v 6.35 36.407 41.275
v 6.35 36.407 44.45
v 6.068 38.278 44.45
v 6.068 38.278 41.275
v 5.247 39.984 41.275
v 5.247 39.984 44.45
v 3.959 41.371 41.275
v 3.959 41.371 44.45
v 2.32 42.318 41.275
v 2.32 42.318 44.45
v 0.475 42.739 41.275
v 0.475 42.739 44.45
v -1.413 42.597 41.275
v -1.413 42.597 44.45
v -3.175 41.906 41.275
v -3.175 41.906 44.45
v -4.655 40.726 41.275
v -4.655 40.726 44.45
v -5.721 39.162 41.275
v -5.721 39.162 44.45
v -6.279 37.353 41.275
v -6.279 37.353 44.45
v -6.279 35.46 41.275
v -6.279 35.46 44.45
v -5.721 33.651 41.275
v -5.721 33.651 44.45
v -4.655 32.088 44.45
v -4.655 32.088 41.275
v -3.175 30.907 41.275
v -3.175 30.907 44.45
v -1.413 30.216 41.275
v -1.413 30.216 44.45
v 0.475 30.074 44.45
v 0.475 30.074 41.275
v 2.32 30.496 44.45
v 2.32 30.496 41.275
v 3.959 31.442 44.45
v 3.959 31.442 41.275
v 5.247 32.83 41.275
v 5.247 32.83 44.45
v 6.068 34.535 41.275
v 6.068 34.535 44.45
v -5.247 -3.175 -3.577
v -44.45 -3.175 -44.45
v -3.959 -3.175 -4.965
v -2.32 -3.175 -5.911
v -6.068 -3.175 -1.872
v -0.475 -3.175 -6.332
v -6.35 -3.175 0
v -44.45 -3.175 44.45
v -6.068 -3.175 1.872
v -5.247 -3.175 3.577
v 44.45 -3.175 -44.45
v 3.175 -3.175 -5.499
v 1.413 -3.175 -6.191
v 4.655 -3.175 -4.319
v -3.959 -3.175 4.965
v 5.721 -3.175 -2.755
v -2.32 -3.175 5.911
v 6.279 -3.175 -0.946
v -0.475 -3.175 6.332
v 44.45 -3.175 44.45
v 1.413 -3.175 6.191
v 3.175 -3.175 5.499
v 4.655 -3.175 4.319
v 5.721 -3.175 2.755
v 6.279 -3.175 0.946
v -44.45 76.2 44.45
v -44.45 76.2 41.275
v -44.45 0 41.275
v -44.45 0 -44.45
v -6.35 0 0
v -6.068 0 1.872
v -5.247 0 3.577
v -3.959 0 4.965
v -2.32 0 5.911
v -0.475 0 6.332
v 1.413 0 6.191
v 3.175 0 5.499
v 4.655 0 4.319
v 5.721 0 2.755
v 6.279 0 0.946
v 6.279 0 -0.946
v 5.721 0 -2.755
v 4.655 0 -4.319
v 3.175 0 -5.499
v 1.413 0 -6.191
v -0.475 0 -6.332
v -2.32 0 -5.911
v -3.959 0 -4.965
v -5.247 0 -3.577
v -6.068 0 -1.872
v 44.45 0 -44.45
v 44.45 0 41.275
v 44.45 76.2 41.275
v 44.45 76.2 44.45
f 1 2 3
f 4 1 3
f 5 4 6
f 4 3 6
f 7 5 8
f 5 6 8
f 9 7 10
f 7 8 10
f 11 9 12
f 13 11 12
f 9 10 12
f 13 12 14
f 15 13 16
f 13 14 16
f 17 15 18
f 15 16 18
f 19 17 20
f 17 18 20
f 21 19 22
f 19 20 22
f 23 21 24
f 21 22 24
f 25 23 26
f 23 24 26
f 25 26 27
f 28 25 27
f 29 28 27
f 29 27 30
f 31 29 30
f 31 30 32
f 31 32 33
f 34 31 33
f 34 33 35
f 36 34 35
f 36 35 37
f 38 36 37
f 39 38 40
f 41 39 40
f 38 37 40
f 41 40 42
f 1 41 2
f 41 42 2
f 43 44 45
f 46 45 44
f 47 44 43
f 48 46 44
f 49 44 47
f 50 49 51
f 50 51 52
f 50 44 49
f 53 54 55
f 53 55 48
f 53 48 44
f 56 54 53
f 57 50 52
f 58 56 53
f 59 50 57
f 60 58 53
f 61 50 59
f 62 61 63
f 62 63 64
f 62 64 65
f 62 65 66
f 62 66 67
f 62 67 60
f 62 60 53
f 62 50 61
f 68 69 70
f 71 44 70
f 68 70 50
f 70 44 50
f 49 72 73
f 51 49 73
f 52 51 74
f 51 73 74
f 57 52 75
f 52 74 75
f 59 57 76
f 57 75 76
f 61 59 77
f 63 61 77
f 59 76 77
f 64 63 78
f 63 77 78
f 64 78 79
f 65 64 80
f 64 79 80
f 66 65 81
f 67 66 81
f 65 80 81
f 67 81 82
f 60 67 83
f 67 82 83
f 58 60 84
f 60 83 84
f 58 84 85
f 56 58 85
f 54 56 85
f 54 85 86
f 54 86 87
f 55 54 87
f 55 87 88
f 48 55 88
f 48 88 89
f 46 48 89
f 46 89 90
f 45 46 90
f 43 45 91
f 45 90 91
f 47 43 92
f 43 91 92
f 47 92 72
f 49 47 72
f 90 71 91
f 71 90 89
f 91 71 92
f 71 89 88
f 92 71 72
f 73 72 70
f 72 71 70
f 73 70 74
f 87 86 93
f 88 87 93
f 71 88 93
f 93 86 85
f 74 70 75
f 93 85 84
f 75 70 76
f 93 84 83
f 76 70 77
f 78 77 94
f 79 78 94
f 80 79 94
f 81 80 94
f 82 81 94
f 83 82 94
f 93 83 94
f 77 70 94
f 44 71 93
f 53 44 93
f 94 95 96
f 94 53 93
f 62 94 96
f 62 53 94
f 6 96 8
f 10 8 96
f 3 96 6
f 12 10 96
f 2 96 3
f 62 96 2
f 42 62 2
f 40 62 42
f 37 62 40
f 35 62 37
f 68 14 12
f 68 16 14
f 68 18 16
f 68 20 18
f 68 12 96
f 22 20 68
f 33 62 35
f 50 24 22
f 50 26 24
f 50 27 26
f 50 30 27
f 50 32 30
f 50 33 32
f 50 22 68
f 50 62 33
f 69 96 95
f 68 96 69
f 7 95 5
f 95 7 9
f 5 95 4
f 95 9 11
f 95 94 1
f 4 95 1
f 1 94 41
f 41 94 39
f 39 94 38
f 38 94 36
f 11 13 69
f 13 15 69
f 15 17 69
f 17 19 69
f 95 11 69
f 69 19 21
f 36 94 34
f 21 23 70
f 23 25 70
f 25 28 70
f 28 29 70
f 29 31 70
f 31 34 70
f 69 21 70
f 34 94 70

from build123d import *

# Parameters (mm, degrees)
F0_W     = 88.9
F0_H     = 88.9
F1_DEPTH = 3.175
F2_W     = 88.9
F2_H     = 3.175
F3_DEPTH = 76.2
F4_R     = 6.35
F5_DEPTH = 3.175
F6_R     = 6.35
F7_DEPTH = 3.175


with BuildPart() as f1:
    # F0 (on Front) → F1 (new body)
    with BuildSketch(Plane.XZ):
        Rectangle(F0_W, F0_H)
    extrude(amount=F1_DEPTH)

    # F2 (on face) → F3 (join)
    with BuildSketch(Plane(origin=(0, 0, 0), x_dir=(-1, 0, 0), z_dir=(0, 1, 0))):
        with Locations((0, 42.8625)):
            Rectangle(F2_W, F2_H)
    extrude(amount=F3_DEPTH)

    # F4 (on face) → F5 (cut)
    with BuildSketch(Plane(origin=(0, 0, 0), x_dir=(-1, 0, 0), z_dir=(0, 1, 0))):
        Circle(F4_R)
    extrude(amount=-F5_DEPTH, mode=Mode.SUBTRACT)

    # F6 (on face) → F7 (cut)
    with BuildSketch(Plane.XY.offset(44.45)):
        with Locations((0, 36.406659)):
            Circle(F6_R)
    extrude(amount=-F7_DEPTH, mode=Mode.SUBTRACT)


solid = f1.part
